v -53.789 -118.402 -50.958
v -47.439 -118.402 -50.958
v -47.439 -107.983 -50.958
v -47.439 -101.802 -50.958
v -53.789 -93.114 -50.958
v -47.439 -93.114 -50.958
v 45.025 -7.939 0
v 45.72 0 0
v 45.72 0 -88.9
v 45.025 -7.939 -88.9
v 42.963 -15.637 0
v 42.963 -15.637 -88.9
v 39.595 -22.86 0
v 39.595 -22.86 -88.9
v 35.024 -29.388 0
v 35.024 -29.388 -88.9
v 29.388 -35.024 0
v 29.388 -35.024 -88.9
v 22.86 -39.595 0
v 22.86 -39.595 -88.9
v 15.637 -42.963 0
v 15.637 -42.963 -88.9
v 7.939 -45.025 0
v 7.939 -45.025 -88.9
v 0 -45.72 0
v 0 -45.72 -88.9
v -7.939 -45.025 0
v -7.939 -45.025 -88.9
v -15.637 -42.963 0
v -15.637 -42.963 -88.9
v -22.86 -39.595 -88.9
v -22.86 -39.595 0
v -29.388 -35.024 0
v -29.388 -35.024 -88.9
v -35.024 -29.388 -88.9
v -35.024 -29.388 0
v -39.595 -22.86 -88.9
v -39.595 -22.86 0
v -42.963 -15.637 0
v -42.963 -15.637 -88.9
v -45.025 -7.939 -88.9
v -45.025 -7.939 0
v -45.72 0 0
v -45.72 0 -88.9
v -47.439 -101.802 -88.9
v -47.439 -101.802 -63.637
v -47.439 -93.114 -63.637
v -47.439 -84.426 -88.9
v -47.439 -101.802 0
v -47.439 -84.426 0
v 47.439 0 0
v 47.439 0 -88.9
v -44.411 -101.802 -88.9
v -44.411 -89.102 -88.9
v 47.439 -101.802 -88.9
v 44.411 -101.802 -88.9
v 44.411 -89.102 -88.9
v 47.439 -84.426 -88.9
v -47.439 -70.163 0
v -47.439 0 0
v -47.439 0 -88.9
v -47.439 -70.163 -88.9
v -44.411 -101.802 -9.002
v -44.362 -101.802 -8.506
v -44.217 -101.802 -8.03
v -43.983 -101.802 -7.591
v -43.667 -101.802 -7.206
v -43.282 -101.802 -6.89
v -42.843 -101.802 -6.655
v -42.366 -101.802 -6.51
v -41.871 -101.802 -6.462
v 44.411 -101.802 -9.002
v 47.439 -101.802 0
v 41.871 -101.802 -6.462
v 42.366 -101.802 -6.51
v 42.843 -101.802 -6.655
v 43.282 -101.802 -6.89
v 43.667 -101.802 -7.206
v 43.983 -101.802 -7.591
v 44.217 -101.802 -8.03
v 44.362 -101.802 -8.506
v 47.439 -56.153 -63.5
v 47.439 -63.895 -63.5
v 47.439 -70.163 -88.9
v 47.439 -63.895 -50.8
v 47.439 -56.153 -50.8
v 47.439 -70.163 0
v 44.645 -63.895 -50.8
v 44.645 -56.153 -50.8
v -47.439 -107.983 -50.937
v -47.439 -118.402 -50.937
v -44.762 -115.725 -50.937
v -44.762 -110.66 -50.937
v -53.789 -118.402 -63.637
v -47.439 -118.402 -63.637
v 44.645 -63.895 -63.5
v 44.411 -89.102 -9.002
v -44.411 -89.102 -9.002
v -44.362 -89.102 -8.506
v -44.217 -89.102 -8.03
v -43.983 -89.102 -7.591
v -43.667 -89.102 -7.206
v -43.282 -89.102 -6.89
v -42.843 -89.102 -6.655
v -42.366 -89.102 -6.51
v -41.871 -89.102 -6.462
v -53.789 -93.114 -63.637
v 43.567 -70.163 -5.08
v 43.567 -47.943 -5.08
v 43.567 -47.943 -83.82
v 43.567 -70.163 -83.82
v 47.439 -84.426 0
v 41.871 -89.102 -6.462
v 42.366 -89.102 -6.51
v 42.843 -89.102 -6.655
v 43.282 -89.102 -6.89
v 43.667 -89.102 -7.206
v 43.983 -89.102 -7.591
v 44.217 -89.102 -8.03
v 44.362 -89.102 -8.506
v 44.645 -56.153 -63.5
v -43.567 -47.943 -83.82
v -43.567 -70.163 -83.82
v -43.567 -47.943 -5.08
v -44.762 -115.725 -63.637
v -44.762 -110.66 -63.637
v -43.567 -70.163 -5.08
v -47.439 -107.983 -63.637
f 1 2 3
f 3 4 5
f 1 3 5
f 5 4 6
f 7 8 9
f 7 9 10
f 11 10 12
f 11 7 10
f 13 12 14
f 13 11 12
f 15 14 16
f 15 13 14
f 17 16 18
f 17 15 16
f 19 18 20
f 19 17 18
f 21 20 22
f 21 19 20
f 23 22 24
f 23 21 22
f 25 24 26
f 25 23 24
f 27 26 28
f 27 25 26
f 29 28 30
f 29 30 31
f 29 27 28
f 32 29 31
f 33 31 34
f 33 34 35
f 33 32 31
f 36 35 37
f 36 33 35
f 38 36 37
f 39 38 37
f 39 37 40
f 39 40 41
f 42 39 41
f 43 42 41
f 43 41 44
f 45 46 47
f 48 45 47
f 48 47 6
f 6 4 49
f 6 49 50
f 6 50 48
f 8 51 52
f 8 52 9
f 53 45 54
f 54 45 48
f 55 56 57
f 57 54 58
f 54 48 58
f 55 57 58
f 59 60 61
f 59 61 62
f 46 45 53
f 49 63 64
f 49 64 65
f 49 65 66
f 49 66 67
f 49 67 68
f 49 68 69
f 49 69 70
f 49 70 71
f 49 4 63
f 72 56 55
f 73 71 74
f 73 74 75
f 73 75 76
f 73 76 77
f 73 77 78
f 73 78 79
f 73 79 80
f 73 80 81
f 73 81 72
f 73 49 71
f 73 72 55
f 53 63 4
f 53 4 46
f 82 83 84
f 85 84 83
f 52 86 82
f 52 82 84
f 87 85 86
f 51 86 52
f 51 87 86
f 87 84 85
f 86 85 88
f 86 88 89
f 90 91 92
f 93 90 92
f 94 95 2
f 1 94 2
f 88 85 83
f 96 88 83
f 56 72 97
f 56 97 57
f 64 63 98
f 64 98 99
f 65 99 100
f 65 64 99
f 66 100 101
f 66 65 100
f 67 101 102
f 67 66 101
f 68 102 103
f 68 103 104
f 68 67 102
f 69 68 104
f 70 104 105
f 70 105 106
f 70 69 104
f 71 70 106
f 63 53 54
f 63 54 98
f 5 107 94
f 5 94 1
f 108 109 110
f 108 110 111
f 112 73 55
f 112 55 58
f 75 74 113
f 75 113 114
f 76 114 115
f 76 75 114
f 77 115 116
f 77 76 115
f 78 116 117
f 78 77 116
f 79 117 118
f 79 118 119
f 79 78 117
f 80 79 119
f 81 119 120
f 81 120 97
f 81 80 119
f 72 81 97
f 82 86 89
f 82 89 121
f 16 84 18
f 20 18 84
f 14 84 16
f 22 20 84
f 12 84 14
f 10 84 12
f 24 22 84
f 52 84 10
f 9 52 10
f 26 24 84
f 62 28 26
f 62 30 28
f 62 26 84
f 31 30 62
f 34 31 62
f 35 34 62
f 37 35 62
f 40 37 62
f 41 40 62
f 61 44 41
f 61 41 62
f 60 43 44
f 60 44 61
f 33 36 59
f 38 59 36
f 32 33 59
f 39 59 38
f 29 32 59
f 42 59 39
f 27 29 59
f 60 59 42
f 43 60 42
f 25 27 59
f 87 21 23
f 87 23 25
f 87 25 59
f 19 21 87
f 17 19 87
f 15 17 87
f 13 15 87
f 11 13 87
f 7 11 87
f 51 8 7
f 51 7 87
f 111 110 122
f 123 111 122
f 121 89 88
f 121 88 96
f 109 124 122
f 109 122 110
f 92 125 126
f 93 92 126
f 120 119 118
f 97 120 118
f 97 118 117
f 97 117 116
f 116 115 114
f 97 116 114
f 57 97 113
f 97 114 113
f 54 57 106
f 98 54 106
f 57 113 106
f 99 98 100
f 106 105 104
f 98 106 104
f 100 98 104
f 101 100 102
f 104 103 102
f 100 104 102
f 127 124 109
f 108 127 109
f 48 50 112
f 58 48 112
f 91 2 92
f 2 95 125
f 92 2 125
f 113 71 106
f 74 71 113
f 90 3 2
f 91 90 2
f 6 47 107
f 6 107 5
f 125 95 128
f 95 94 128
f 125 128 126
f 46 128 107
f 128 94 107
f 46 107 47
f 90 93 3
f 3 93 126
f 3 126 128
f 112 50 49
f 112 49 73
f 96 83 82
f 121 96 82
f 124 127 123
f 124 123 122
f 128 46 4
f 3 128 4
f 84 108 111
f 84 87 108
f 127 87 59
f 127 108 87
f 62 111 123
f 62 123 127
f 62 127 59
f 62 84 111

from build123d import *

# Parameters (mm, degrees)
BOSS_EXTRUDE1_DEPTH   = 88.9
SKETCH1_W             = 94.878512488
SKETCH1_H             = 17.376026141
BOSS_EXTRUDE1_2_DEPTH = 88.9
SKETCH8_W             = 87.134578152
SKETCH8_H             = 22.219668138
BOSS_EXTRUDE2_DEPTH   = 5.08
SKETCH9_W             = 87.134578152
SKETCH9_H             = 22.219668138
BOSS_EXTRUDE3_DEPTH   = 5.08
CUT_EXTRUDE1_DEPTH    = 12.7
SKETCH11_W            = 12.678767115
SKETCH11_H            = 25.288130555
BOSS_EXTRUDE4_DEPTH   = 6.35
BOSS_EXTRUDE5_DEPTH   = 12.7
SKETCH13_W            = 12.7
SKETCH13_H            = 7.741896913
CUT_EXTRUDE2_DEPTH    = 2.794


with BuildPart() as part:
    # Sketch1 → Boss-Extrude1 (new body)
    with BuildSketch(Plane.XY):
        with BuildLine():
            ThreePointArc((45.72, 0), (0, -45.72), (-45.72, 0))
            Line((-45.72, 0), (-47.439256244, 0))
            Line((-47.439256244, 0), (-47.439256244, -70.162974211))
            Line((-47.439256244, -70.162974211), (-43.567289076, -70.162974211))
            Line((-43.567289076, -70.162974211), (-43.567289076, -47.943306073))
            Line((-43.567289076, -47.943306073), (43.567289076, -47.943306073))
            Line((43.567289076, -47.943306073), (43.567289076, -70.162974211))
            Line((43.567289076, -70.162974211), (47.439256244, -70.162974211))
            Line((47.439256244, -70.162974211), (47.439256244, 0))
            Line((47.439256244, 0), (45.72, 0))
        make_face()
    extrude(amount=-BOSS_EXTRUDE1_DEPTH)

    # Sketch8 → Boss-Extrude2 (add)
    with BuildSketch(Plane.XY):
        with Locations((0, -59.053140142)):
            Rectangle(SKETCH8_W, SKETCH8_H)
    extrude(amount=-BOSS_EXTRUDE2_DEPTH)

    # Sketch9 → Boss-Extrude3 (add)
    with BuildSketch(Plane(origin=(0, 0, -88.9), x_dir=(-1, 0, 0), z_dir=(0, 0, -1))):
        with Locations((0, -59.053140142)):
            Rectangle(SKETCH9_W, SKETCH9_H)
    extrude(amount=-BOSS_EXTRUDE3_DEPTH)

    # Sketch13 → Cut-Extrude2 (cut)
    with BuildSketch(Plane(origin=(47.439256244, 0, 0), x_dir=(0, 0, -1), z_dir=(1, 0, 0))):
        with Locations((57.15, -60.02391027)):
            Rectangle(SKETCH13_W, SKETCH13_H)
    extrude(amount=-CUT_EXTRUDE2_DEPTH, mode=Mode.SUBTRACT)


with BuildPart() as body_2:
    # Sketch1 → Boss-Extrude1 2 (new body)
    with BuildSketch(Plane.XY):
        with Locations((0, -93.114019191)):
            Rectangle(SKETCH1_W, SKETCH1_H)
    extrude(amount=-BOSS_EXTRUDE1_2_DEPTH)

    # Sketch10 → Cut-Extrude1 (cut)
    with BuildSketch(Plane.XZ.offset(101.802032261)):
        with BuildLine():
            Line((-41.870605058, -6.461673731), (41.870605058, -6.461673731))
            ThreePointArc((41.870605058, -6.461673731), (43.666656283, -7.205622507), (44.410605058, -9.001673731))
            Line((44.410605058, -9.001673731), (44.410605058, -105.65673434))
            ThreePointArc((44.410605058, -105.65673434), (43.666656283, -107.452785564), (41.870605058, -108.19673434))
            Line((41.870605058, -108.19673434), (-41.870605058, -108.19673434))
            ThreePointArc((-41.870605058, -108.19673434), (-43.666656283, -107.452785564), (-44.410605058, -105.65673434))
            Line((-44.410605058, -105.65673434), (-44.410605058, -9.001673731))
            ThreePointArc((-44.410605058, -9.001673731), (-43.666656283, -7.205622507), (-41.870605058, -6.461673731))
        make_face()
    extrude(amount=-CUT_EXTRUDE1_DEPTH, mode=Mode.SUBTRACT)

    # Sketch11 → Boss-Extrude4 (add)
    with BuildSketch(Plane.ZY.offset(47.439256244)):
        with Locations((-57.297427525, -105.758084467)):
            Rectangle(SKETCH11_W, SKETCH11_H)
    extrude(amount=BOSS_EXTRUDE4_DEPTH)

    # Sketch12 → Boss-Extrude5 (add)
    with BuildSketch(Plane(origin=(0, 0, -63.636811082), x_dir=(-1, 0, 0), z_dir=(0, 0, -1))):
        Polygon((47.439256244, -118.402149745), (44.762238893, -115.725132393), (44.762238893, -110.660252831), (47.439256244, -107.98323548), align=None)
    extrude(amount=-BOSS_EXTRUDE5_DEPTH)


solid = Compound([part.part, body_2.part])
